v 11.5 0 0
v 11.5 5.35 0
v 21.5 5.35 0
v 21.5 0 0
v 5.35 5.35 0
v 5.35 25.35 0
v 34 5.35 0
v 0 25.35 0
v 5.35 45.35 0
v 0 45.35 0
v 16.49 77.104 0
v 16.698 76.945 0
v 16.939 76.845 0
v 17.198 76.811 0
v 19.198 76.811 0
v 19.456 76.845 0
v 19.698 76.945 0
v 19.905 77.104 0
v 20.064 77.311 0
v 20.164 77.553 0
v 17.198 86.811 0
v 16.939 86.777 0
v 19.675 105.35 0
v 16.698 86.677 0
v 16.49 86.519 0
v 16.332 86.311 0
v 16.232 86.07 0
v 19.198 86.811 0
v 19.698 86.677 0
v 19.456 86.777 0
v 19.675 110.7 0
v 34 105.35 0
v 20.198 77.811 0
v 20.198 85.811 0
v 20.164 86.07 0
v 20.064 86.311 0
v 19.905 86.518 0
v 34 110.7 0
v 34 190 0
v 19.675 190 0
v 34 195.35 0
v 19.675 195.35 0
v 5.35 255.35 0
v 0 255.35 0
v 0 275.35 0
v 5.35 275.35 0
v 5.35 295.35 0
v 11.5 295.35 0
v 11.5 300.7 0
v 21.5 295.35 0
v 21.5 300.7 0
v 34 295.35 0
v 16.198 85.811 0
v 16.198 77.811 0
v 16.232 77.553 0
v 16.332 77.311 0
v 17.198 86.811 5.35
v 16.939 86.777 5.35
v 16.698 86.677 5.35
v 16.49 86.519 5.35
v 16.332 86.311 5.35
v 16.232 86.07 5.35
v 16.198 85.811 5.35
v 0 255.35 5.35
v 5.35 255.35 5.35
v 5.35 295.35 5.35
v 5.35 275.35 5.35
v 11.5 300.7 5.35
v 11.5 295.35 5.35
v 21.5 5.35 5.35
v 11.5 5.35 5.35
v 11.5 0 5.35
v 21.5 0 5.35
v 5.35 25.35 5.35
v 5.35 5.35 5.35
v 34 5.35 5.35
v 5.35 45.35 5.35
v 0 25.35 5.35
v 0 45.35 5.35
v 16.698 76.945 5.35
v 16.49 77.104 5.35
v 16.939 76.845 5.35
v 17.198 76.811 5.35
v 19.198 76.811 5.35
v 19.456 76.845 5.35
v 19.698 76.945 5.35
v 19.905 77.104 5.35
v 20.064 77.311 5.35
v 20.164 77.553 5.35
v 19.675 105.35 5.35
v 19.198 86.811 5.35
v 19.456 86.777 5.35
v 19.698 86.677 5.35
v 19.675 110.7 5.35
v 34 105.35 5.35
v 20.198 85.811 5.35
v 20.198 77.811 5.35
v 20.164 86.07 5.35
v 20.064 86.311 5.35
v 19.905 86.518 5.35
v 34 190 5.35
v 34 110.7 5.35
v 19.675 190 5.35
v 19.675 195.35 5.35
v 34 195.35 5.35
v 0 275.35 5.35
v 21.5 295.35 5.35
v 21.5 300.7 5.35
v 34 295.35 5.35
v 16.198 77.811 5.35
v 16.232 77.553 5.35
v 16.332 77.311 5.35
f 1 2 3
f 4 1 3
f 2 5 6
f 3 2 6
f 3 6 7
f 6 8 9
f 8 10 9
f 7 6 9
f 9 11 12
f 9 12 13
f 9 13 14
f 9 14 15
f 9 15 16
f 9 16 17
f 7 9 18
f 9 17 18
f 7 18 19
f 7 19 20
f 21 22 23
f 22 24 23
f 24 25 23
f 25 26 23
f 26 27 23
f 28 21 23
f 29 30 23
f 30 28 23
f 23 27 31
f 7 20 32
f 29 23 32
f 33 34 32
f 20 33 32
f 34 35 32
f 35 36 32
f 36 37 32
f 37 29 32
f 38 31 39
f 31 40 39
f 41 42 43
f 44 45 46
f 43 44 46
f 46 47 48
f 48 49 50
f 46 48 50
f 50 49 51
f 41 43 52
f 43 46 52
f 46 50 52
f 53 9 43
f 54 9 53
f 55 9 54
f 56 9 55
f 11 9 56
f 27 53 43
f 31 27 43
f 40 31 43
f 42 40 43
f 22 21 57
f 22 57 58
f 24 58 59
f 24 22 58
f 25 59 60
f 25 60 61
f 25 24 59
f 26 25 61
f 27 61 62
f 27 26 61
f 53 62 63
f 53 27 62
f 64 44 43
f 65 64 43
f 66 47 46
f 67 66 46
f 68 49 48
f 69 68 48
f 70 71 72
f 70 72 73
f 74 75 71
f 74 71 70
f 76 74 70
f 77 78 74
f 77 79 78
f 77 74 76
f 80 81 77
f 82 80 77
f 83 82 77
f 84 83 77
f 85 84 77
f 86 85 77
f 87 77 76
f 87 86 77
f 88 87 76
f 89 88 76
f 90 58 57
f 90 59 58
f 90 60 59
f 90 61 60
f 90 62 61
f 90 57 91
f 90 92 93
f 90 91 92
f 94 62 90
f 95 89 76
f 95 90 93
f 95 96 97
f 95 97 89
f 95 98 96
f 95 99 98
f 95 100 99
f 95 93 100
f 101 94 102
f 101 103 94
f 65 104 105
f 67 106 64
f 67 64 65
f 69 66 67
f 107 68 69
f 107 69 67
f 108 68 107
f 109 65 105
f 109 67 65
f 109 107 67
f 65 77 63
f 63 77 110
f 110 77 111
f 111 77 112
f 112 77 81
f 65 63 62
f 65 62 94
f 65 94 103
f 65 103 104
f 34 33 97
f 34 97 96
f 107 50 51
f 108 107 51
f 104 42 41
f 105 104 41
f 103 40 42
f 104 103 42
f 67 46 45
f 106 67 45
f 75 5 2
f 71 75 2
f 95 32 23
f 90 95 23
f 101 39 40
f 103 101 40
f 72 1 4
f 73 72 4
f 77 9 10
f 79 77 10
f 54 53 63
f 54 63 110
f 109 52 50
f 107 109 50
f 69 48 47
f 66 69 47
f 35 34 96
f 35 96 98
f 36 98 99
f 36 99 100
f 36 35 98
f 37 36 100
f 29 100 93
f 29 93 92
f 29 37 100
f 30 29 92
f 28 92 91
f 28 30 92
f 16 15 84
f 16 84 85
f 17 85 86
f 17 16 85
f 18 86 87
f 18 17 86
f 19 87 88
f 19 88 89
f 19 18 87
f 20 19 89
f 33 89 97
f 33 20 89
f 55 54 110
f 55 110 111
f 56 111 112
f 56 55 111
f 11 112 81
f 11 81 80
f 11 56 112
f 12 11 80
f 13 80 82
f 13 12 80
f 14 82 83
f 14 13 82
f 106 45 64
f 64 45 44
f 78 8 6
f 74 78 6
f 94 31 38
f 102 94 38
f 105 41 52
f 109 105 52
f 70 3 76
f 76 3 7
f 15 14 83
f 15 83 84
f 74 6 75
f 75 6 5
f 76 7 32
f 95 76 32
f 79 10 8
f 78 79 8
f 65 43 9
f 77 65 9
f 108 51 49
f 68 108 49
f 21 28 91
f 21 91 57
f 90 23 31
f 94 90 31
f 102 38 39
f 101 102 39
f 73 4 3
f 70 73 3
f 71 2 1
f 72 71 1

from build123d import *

# Parameters (mm, degrees)
BOSS_EXTRUDE1_DEPTH = 5.35


with BuildPart() as part:
    # Model → Boss-Extrude1 (new body)
    with BuildSketch(Plane.XY):
        Polygon((0, 25.350004435), (5.350001156, 25.350004435), (5.350001156, 5.350008607), (11.500000954, 5.350008607), (11.500000954, 0), (21.50000073, 0), (21.50000073, 5.350008607), (34.000000916, 5.350008607), (34.000000916, 105.350002646), (19.675000687, 105.350002646), (19.675000687, 110.700011253), (34.000000916, 110.700011253), (34.000000916, 190.000005066), (19.675000687, 190.000005066), (19.675000687, 195.350006223), (34.000000916, 195.350006223), (34.000000916, 295.350007713), (21.50000073, 295.350007713), (21.50000073, 300.700008869), (11.500000954, 300.700008869), (11.500000954, 295.350007713), (5.350001156, 295.350007713), (5.350001156, 275.35000816), (0, 275.35000816), (0, 255.350007676), (5.350001156, 255.350007676), (5.350001156, 45.350000262), (0, 45.350000262), align=None)
        with BuildLine():
            Line((20.197596634, 77.811388135), (20.197596634, 85.811391473))
            ThreePointArc((20.197596634, 85.811391473), (19.904704132, 86.518499564), (19.197596634, 86.811393499))
            Line((19.197596634, 86.811393499), (17.197596841, 86.811393499))
            ThreePointArc((17.197596841, 86.811393499), (16.490489953, 86.518500339), (16.197596677, 85.811393499))
            Line((16.197596677, 85.811393499), (16.197596677, 77.811390161))
            ThreePointArc((16.197596677, 77.811390161), (16.490489179, 77.10428207), (17.197596677, 76.811388135))
            Line((17.197596677, 76.811388135), (19.197596703, 76.811388135))
            ThreePointArc((19.197596703, 76.811388135), (19.904703439, 77.104281378), (20.197596634, 77.811388135))
        make_face(mode=Mode.SUBTRACT)
    extrude(amount=BOSS_EXTRUDE1_DEPTH)


solid = part.part
